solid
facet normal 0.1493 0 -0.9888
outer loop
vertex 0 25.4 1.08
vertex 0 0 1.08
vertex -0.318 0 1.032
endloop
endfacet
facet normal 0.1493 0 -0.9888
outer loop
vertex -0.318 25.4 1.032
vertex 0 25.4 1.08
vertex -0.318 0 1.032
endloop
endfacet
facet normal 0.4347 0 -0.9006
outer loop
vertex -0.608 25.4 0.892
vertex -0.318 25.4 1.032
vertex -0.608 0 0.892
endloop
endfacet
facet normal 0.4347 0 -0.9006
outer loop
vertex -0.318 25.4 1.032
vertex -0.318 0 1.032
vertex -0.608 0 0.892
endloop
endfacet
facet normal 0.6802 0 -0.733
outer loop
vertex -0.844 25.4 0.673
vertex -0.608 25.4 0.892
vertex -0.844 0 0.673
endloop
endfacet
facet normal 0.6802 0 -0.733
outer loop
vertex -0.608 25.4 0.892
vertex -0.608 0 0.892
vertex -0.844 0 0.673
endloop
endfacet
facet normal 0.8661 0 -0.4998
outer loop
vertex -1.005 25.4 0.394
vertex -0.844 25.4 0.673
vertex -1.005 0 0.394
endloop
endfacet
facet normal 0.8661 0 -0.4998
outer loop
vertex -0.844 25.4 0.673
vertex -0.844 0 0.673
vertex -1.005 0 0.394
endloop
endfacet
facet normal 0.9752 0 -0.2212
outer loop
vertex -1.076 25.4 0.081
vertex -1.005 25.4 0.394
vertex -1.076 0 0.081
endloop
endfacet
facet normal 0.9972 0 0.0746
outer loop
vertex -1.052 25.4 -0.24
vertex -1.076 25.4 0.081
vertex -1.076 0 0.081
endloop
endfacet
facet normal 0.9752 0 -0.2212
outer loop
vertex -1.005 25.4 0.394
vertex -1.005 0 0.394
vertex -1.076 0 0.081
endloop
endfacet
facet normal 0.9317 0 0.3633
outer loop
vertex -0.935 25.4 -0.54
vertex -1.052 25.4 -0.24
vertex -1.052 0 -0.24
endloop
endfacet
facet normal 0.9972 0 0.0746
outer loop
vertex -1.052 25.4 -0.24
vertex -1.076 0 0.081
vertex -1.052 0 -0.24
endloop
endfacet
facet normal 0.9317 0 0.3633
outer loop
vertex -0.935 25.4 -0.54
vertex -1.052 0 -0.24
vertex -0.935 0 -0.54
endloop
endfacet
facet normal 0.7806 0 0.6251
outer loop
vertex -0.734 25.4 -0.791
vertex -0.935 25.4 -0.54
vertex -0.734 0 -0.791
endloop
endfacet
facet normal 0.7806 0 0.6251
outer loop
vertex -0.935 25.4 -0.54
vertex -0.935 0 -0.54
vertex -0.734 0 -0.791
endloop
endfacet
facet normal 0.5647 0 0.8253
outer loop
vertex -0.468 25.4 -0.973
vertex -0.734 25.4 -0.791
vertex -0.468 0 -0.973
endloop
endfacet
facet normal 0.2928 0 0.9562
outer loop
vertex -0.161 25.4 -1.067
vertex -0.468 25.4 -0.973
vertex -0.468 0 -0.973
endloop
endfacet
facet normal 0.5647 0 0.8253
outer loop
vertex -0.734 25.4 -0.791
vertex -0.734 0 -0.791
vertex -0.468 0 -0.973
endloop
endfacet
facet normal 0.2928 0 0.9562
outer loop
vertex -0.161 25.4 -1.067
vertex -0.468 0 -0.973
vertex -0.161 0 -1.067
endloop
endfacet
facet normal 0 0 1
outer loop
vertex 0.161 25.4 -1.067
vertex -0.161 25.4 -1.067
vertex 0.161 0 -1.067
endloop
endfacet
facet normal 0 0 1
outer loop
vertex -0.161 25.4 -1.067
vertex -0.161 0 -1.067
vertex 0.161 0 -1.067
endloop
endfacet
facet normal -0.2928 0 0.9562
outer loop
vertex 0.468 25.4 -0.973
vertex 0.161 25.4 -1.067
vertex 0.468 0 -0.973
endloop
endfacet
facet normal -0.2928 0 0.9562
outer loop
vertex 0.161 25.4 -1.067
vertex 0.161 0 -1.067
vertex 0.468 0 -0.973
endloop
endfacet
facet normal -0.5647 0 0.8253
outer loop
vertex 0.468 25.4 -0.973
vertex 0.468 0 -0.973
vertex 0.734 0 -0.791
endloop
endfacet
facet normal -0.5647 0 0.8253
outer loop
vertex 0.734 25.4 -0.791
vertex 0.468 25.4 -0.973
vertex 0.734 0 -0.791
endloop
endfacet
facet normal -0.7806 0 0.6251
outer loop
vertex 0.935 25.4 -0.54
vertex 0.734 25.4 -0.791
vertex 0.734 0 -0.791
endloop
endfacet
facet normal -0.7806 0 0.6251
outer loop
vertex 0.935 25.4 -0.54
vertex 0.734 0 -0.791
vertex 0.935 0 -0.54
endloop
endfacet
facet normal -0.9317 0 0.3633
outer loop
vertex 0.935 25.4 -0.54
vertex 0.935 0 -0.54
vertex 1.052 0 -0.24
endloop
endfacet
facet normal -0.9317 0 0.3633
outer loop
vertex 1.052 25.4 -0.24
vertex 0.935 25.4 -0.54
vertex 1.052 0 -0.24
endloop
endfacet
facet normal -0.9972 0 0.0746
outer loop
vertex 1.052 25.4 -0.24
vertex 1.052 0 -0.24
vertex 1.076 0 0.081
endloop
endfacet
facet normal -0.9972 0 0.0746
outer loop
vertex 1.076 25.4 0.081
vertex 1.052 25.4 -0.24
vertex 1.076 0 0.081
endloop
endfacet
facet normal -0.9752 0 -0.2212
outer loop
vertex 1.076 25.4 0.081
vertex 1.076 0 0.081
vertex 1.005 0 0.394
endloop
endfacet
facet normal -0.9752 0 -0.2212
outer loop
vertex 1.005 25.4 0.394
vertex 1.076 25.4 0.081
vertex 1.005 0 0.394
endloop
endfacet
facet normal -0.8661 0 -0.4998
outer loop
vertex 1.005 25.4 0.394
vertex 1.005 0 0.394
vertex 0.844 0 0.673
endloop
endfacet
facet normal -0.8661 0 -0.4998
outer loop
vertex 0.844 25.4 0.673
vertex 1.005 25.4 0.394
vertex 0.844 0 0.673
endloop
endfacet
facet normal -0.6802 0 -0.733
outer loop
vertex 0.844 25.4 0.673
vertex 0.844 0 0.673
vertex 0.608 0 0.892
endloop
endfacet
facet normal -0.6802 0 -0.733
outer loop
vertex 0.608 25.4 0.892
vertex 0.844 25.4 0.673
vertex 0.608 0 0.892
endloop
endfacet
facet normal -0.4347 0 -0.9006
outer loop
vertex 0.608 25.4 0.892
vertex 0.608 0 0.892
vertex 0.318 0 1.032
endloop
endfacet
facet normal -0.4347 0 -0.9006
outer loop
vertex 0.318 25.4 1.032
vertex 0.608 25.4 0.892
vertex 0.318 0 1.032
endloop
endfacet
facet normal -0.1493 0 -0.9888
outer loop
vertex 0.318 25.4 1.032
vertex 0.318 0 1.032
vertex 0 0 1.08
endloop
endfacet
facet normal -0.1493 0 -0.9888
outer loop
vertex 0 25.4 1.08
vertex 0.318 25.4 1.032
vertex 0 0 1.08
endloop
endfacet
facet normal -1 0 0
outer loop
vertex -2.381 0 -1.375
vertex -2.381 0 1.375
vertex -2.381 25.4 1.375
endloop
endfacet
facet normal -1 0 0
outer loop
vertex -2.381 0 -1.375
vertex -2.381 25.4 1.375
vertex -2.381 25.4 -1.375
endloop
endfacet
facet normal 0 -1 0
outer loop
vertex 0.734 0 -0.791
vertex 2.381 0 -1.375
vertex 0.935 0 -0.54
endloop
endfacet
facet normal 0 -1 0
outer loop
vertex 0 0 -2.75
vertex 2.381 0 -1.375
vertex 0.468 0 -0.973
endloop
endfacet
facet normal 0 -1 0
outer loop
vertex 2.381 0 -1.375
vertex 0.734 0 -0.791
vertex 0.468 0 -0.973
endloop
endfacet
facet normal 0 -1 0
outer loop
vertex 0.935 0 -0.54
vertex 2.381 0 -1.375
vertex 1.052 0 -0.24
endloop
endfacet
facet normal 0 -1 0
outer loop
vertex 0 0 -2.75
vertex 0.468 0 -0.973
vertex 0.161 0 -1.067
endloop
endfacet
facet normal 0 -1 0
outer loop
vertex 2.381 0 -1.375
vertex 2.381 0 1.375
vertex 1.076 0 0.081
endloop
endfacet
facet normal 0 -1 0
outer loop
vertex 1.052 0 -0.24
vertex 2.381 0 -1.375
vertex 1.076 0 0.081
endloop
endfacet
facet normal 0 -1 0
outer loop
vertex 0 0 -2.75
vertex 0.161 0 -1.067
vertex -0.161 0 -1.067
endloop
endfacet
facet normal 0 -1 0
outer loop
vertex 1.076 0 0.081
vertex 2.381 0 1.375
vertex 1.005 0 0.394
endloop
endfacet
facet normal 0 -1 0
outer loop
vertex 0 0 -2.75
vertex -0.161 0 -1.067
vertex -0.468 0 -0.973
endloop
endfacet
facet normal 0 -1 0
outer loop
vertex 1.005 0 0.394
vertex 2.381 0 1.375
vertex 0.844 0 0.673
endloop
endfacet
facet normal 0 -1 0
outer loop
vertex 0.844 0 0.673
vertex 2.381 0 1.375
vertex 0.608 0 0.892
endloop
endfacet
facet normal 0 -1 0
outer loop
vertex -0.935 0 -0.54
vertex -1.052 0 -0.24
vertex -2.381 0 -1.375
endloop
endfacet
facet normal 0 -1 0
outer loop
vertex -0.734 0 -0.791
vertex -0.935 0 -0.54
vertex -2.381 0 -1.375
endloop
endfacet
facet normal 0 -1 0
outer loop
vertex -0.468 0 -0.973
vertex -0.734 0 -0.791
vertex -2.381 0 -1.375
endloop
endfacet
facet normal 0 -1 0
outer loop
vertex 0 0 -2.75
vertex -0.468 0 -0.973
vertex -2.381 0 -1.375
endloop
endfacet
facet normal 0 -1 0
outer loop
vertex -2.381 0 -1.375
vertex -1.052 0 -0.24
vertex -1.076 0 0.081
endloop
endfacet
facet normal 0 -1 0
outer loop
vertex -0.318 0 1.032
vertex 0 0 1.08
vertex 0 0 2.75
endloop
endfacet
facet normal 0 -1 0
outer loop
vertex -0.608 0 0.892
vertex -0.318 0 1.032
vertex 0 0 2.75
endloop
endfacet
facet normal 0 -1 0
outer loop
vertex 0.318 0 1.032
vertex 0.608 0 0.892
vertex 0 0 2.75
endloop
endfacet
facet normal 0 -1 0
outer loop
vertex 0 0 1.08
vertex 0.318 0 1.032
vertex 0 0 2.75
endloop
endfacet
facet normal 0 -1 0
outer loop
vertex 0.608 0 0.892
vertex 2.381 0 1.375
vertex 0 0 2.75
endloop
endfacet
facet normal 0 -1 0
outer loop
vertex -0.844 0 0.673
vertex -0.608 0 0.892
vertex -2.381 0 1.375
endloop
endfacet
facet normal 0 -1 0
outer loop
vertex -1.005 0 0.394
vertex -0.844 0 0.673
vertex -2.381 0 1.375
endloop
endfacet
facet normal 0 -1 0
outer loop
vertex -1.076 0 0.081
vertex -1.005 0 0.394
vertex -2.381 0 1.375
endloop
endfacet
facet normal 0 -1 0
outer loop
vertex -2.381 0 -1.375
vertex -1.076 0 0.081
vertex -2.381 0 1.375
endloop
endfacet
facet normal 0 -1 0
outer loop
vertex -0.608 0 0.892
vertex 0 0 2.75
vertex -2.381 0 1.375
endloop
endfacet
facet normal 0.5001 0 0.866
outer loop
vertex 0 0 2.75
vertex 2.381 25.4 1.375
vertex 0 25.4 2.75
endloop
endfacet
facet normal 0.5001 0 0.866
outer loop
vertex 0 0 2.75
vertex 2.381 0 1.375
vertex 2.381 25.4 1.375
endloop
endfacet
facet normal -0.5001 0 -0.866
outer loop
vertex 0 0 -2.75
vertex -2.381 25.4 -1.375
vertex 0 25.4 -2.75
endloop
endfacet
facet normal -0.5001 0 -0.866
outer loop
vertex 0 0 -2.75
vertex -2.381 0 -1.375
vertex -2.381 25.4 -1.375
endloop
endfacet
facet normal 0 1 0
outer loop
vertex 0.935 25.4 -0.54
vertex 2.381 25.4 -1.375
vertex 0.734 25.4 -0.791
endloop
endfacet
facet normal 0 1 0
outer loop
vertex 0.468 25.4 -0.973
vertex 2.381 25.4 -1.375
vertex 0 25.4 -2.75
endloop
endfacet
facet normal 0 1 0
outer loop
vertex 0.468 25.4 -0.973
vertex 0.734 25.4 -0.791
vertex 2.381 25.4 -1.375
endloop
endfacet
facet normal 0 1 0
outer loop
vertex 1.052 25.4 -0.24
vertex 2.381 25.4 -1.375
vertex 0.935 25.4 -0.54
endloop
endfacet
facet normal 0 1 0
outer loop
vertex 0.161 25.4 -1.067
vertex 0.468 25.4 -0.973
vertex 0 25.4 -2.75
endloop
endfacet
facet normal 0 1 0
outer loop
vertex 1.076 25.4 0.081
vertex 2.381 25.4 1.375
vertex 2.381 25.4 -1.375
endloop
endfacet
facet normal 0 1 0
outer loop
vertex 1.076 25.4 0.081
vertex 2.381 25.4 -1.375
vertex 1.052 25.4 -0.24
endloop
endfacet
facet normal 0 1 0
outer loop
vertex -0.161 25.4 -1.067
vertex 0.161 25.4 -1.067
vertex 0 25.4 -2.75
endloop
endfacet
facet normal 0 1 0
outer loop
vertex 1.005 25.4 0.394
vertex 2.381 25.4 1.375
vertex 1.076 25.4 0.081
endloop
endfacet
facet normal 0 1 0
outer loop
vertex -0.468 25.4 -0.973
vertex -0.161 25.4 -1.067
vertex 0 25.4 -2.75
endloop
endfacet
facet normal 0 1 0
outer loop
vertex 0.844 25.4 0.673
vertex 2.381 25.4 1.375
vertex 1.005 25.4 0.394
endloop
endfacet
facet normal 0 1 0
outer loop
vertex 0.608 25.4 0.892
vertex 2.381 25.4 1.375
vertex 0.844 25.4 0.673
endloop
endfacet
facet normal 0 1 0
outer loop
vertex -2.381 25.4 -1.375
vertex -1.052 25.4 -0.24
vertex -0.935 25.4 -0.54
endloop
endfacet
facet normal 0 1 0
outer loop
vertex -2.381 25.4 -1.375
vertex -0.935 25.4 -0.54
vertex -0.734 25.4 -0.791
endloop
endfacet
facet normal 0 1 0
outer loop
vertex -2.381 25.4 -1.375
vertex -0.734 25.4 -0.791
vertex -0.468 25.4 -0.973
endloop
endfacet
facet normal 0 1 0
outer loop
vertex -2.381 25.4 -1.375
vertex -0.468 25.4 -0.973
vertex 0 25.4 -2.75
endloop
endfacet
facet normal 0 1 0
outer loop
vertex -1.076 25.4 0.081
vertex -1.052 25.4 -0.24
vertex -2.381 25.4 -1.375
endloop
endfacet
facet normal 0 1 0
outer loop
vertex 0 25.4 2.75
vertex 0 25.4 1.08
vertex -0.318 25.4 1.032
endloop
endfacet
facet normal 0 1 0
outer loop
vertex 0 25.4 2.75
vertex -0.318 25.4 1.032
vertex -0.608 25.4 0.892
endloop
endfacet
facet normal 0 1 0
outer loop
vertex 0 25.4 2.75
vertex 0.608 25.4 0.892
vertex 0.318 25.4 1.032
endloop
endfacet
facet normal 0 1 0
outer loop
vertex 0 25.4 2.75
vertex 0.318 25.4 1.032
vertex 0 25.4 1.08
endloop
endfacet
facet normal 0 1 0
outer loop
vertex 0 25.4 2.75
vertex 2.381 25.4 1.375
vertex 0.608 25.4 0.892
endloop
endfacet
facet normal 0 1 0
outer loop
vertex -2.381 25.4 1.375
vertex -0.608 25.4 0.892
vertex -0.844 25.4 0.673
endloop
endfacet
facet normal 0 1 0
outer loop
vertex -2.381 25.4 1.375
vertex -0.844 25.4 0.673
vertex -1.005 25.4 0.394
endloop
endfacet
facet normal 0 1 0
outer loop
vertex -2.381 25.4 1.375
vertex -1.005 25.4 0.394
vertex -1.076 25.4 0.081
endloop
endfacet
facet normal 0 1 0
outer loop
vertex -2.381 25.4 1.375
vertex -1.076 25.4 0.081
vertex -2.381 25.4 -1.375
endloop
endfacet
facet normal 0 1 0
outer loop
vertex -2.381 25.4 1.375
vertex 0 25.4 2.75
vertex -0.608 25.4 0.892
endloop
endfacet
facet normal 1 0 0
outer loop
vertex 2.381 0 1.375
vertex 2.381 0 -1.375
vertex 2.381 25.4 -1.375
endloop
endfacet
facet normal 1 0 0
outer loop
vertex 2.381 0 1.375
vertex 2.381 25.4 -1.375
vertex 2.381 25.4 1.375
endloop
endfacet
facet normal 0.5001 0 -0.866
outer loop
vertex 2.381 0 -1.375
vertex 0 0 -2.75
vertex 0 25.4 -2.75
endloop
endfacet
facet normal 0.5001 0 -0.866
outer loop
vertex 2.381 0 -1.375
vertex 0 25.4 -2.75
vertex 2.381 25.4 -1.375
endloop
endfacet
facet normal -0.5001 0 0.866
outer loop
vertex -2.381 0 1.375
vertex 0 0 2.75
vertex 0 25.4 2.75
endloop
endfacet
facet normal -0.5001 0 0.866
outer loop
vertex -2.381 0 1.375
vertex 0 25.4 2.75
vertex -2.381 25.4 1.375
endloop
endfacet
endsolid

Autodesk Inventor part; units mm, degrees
ref_plane "YZ Plane" through (0, 0, 0) normal (1, 0, 0) x (0, 1, 0)
ref_plane "XZ Plane" through (0, 0, 0) normal (0, 1, 0) x (-1, 0, 0)
ref_plane "XY Plane" through (0, 0, 0) normal (0, 0, 1) x (1, 0, 0)
sketch "Sketch1" plane through (0, 0, 0) normal (0, 1, 0) x (-1, 0, 0)
  line L0 (0, -2.7496) -> (-2.3812, -1.3748)
  line L1 (-2.3812, -1.3748) -> (-2.3813, 1.3748)
  line L2 (-2.3813, 1.3748) -> (0, 2.7496)
  line L3 (0, 2.7496) -> (2.3812, 1.3748)
  line L4 (2.3812, 1.3748) -> (2.3813, -1.3748)
  line L5 (2.3813, -1.3748) -> (0, -2.7496)
  point P0 (0, 0)
  point P1 (0, 0)
  dimension "d0" = 4.7625
extrude "Extrusion1" add sketch "Sketch1" along normal blind 25.4
sketch "Sketch2" plane through (0, 25.4, 0) normal (0, 1, 0) x (1, 0, 0)
  point P0 (0, 0)
  point P1 (0, 0)
hole "Hole1" at (0, 25.4, 0) direction (0, -1, 0) diameter 2.159 end through all
properties part number "standoff"
